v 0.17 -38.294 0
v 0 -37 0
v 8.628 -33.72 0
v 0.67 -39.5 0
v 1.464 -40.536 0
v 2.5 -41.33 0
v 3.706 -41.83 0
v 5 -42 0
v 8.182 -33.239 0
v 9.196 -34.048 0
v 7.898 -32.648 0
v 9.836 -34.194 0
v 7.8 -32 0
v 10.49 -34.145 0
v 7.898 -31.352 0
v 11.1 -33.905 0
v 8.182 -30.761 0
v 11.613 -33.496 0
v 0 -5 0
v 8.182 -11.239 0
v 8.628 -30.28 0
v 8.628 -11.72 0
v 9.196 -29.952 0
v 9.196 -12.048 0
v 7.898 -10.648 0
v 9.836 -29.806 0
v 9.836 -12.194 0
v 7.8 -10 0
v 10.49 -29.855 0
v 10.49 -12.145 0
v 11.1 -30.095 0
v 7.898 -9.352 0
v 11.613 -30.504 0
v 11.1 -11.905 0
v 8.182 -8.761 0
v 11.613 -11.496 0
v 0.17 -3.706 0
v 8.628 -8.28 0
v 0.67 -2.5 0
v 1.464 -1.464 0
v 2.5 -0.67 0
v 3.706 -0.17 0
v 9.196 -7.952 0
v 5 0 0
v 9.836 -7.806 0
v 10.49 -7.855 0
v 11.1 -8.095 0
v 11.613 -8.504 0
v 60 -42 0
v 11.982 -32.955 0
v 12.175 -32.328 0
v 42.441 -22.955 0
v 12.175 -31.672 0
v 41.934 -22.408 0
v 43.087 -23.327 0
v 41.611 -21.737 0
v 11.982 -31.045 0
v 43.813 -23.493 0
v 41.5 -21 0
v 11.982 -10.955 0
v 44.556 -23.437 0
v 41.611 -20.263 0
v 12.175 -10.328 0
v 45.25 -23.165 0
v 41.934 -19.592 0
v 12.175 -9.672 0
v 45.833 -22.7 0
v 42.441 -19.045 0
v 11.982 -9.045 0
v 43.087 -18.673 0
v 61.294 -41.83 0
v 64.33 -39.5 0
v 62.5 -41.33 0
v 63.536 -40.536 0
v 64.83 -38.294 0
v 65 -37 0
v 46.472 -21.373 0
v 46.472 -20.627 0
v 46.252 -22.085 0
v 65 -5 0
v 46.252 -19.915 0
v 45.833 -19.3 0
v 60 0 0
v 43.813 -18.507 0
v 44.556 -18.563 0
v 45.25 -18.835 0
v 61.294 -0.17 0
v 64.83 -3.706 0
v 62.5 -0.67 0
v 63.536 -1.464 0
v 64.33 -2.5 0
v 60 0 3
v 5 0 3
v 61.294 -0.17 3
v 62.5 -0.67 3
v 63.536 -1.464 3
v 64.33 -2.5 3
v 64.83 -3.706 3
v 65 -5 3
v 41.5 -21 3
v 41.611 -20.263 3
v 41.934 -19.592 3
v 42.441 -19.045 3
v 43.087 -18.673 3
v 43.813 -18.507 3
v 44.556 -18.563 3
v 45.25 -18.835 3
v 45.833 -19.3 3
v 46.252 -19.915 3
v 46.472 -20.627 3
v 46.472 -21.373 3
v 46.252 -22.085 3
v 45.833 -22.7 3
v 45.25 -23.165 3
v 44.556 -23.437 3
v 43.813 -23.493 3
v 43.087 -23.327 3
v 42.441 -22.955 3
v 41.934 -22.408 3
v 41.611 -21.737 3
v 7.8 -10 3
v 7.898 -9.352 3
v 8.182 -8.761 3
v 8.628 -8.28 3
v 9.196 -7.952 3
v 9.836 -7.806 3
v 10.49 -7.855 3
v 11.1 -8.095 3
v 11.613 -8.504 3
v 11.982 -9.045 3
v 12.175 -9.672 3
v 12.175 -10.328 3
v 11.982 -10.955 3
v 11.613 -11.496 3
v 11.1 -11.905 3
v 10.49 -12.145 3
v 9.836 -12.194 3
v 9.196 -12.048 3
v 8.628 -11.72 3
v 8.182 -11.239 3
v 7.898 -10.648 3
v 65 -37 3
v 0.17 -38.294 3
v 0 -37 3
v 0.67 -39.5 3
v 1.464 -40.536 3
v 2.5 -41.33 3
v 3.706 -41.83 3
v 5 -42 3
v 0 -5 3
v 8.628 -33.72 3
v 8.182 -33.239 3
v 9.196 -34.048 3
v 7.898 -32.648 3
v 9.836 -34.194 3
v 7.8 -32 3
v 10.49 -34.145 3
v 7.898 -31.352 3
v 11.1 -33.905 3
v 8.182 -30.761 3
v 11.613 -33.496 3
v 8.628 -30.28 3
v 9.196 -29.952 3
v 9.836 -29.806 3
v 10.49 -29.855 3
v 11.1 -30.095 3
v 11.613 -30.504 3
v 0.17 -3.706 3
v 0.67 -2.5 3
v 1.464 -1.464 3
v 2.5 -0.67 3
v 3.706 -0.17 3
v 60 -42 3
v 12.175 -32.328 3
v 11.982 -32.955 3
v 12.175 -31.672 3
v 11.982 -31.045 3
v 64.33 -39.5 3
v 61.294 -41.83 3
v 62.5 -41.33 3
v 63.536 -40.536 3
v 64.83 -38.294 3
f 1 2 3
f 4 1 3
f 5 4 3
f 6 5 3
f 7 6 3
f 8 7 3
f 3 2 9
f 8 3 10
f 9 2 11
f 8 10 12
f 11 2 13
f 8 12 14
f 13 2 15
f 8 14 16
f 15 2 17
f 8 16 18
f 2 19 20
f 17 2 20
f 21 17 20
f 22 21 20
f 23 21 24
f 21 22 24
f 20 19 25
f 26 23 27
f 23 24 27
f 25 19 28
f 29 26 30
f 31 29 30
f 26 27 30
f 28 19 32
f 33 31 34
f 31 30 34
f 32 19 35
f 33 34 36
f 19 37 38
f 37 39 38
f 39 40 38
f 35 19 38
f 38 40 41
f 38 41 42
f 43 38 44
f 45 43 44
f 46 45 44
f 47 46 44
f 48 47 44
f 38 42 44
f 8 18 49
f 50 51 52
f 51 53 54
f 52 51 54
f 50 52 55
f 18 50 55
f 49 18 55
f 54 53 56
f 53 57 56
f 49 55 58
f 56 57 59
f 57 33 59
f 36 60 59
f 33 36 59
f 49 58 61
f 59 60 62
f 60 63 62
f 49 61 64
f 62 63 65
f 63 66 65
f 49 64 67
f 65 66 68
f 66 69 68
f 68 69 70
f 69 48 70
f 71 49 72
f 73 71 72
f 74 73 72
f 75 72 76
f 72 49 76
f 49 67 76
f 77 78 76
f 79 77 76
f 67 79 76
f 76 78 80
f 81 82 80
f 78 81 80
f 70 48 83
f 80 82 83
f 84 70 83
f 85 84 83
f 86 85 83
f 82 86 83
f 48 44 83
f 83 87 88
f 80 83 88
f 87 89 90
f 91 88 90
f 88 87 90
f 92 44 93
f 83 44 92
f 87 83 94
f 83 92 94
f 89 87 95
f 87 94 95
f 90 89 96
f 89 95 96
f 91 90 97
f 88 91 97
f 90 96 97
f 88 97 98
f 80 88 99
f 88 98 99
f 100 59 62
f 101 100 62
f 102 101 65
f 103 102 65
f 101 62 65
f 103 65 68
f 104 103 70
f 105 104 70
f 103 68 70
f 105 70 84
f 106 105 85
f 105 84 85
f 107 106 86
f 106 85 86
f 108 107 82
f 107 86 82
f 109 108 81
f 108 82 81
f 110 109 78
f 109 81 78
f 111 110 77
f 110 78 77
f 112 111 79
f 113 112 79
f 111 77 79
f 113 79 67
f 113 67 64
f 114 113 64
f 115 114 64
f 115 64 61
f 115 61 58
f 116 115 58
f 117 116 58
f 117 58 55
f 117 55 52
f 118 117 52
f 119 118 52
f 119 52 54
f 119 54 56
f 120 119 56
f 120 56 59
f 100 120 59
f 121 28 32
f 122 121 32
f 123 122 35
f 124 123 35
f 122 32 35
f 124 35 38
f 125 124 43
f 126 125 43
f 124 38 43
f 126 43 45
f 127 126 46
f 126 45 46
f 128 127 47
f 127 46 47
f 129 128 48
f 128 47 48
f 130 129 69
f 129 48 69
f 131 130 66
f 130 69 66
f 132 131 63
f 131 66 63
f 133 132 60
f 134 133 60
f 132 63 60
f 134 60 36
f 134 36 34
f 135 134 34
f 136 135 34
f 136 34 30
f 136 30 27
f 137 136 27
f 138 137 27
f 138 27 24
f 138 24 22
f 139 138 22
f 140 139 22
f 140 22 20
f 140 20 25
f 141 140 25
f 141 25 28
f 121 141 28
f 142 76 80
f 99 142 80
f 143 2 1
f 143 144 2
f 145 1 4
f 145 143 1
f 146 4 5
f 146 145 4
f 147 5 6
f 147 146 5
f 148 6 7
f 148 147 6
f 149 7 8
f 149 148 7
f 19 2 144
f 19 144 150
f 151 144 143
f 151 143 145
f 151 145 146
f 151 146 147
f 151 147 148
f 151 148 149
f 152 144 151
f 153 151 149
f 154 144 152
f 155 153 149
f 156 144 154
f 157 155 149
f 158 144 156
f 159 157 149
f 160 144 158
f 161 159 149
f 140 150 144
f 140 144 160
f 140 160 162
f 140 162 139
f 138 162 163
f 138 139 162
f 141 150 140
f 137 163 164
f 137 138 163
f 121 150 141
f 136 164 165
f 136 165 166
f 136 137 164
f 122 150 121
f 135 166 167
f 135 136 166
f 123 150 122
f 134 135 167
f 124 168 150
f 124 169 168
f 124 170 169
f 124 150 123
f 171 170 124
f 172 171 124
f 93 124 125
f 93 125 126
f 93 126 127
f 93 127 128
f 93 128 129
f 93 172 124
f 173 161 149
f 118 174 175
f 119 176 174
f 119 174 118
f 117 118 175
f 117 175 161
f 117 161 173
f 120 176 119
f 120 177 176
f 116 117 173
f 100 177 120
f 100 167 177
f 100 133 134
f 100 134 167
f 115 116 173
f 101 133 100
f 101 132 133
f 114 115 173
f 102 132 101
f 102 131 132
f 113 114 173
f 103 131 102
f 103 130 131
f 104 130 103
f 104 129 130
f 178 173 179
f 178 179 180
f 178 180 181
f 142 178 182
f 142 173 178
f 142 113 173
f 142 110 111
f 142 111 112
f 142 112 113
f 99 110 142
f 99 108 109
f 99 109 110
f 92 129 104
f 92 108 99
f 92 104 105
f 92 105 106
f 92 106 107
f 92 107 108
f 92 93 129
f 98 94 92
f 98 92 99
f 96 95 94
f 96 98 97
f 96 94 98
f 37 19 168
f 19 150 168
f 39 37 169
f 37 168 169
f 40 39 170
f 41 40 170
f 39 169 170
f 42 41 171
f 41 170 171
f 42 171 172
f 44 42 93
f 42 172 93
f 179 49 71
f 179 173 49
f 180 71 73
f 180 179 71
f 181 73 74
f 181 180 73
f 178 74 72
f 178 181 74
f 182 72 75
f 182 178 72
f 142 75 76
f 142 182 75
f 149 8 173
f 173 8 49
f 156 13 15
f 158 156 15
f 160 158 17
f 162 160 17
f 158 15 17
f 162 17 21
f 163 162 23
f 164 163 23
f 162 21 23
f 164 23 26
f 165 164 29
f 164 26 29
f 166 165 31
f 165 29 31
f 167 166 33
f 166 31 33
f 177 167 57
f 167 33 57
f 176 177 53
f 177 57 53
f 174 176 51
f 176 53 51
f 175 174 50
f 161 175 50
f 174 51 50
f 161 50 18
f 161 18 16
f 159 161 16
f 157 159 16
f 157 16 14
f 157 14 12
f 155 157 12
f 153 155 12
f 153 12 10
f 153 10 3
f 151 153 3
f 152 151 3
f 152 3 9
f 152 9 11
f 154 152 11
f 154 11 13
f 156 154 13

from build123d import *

# Parameters (mm, degrees)
F0_W     = 65
F0_H     = 42
F1_DEPTH = 3
F3_D     = 4.4
F4_D     = 5
F5_R     = 5


with BuildPart() as f1:
    # F0 (on Top) → F1 (new body)
    with BuildSketch(Plane.XY):
        with Locations((32.5, -21)):
            Rectangle(F0_W, F0_H)
    extrude(amount=F1_DEPTH)

    # F3 (through all)
    with Locations(Plane.XY.offset(3)):
        with Locations((10, -10), (10, -32)):
            Hole(F3_D / 2)

    # F4 (through all)
    with Locations(Plane.XY.offset(3)):
        with Locations((44, -21)):
            Hole(F4_D / 2)

    # F5
    f5_edges = [f1.edges().sort_by_distance(p)[0] for p in [
        (0, -42, 1.5),
        (65, -42, 1.5),
        (65, 0, 1.5),
        (0, 0, 1.5),
    ]]
    fillet(f5_edges, radius=F5_R)


solid = f1.part
